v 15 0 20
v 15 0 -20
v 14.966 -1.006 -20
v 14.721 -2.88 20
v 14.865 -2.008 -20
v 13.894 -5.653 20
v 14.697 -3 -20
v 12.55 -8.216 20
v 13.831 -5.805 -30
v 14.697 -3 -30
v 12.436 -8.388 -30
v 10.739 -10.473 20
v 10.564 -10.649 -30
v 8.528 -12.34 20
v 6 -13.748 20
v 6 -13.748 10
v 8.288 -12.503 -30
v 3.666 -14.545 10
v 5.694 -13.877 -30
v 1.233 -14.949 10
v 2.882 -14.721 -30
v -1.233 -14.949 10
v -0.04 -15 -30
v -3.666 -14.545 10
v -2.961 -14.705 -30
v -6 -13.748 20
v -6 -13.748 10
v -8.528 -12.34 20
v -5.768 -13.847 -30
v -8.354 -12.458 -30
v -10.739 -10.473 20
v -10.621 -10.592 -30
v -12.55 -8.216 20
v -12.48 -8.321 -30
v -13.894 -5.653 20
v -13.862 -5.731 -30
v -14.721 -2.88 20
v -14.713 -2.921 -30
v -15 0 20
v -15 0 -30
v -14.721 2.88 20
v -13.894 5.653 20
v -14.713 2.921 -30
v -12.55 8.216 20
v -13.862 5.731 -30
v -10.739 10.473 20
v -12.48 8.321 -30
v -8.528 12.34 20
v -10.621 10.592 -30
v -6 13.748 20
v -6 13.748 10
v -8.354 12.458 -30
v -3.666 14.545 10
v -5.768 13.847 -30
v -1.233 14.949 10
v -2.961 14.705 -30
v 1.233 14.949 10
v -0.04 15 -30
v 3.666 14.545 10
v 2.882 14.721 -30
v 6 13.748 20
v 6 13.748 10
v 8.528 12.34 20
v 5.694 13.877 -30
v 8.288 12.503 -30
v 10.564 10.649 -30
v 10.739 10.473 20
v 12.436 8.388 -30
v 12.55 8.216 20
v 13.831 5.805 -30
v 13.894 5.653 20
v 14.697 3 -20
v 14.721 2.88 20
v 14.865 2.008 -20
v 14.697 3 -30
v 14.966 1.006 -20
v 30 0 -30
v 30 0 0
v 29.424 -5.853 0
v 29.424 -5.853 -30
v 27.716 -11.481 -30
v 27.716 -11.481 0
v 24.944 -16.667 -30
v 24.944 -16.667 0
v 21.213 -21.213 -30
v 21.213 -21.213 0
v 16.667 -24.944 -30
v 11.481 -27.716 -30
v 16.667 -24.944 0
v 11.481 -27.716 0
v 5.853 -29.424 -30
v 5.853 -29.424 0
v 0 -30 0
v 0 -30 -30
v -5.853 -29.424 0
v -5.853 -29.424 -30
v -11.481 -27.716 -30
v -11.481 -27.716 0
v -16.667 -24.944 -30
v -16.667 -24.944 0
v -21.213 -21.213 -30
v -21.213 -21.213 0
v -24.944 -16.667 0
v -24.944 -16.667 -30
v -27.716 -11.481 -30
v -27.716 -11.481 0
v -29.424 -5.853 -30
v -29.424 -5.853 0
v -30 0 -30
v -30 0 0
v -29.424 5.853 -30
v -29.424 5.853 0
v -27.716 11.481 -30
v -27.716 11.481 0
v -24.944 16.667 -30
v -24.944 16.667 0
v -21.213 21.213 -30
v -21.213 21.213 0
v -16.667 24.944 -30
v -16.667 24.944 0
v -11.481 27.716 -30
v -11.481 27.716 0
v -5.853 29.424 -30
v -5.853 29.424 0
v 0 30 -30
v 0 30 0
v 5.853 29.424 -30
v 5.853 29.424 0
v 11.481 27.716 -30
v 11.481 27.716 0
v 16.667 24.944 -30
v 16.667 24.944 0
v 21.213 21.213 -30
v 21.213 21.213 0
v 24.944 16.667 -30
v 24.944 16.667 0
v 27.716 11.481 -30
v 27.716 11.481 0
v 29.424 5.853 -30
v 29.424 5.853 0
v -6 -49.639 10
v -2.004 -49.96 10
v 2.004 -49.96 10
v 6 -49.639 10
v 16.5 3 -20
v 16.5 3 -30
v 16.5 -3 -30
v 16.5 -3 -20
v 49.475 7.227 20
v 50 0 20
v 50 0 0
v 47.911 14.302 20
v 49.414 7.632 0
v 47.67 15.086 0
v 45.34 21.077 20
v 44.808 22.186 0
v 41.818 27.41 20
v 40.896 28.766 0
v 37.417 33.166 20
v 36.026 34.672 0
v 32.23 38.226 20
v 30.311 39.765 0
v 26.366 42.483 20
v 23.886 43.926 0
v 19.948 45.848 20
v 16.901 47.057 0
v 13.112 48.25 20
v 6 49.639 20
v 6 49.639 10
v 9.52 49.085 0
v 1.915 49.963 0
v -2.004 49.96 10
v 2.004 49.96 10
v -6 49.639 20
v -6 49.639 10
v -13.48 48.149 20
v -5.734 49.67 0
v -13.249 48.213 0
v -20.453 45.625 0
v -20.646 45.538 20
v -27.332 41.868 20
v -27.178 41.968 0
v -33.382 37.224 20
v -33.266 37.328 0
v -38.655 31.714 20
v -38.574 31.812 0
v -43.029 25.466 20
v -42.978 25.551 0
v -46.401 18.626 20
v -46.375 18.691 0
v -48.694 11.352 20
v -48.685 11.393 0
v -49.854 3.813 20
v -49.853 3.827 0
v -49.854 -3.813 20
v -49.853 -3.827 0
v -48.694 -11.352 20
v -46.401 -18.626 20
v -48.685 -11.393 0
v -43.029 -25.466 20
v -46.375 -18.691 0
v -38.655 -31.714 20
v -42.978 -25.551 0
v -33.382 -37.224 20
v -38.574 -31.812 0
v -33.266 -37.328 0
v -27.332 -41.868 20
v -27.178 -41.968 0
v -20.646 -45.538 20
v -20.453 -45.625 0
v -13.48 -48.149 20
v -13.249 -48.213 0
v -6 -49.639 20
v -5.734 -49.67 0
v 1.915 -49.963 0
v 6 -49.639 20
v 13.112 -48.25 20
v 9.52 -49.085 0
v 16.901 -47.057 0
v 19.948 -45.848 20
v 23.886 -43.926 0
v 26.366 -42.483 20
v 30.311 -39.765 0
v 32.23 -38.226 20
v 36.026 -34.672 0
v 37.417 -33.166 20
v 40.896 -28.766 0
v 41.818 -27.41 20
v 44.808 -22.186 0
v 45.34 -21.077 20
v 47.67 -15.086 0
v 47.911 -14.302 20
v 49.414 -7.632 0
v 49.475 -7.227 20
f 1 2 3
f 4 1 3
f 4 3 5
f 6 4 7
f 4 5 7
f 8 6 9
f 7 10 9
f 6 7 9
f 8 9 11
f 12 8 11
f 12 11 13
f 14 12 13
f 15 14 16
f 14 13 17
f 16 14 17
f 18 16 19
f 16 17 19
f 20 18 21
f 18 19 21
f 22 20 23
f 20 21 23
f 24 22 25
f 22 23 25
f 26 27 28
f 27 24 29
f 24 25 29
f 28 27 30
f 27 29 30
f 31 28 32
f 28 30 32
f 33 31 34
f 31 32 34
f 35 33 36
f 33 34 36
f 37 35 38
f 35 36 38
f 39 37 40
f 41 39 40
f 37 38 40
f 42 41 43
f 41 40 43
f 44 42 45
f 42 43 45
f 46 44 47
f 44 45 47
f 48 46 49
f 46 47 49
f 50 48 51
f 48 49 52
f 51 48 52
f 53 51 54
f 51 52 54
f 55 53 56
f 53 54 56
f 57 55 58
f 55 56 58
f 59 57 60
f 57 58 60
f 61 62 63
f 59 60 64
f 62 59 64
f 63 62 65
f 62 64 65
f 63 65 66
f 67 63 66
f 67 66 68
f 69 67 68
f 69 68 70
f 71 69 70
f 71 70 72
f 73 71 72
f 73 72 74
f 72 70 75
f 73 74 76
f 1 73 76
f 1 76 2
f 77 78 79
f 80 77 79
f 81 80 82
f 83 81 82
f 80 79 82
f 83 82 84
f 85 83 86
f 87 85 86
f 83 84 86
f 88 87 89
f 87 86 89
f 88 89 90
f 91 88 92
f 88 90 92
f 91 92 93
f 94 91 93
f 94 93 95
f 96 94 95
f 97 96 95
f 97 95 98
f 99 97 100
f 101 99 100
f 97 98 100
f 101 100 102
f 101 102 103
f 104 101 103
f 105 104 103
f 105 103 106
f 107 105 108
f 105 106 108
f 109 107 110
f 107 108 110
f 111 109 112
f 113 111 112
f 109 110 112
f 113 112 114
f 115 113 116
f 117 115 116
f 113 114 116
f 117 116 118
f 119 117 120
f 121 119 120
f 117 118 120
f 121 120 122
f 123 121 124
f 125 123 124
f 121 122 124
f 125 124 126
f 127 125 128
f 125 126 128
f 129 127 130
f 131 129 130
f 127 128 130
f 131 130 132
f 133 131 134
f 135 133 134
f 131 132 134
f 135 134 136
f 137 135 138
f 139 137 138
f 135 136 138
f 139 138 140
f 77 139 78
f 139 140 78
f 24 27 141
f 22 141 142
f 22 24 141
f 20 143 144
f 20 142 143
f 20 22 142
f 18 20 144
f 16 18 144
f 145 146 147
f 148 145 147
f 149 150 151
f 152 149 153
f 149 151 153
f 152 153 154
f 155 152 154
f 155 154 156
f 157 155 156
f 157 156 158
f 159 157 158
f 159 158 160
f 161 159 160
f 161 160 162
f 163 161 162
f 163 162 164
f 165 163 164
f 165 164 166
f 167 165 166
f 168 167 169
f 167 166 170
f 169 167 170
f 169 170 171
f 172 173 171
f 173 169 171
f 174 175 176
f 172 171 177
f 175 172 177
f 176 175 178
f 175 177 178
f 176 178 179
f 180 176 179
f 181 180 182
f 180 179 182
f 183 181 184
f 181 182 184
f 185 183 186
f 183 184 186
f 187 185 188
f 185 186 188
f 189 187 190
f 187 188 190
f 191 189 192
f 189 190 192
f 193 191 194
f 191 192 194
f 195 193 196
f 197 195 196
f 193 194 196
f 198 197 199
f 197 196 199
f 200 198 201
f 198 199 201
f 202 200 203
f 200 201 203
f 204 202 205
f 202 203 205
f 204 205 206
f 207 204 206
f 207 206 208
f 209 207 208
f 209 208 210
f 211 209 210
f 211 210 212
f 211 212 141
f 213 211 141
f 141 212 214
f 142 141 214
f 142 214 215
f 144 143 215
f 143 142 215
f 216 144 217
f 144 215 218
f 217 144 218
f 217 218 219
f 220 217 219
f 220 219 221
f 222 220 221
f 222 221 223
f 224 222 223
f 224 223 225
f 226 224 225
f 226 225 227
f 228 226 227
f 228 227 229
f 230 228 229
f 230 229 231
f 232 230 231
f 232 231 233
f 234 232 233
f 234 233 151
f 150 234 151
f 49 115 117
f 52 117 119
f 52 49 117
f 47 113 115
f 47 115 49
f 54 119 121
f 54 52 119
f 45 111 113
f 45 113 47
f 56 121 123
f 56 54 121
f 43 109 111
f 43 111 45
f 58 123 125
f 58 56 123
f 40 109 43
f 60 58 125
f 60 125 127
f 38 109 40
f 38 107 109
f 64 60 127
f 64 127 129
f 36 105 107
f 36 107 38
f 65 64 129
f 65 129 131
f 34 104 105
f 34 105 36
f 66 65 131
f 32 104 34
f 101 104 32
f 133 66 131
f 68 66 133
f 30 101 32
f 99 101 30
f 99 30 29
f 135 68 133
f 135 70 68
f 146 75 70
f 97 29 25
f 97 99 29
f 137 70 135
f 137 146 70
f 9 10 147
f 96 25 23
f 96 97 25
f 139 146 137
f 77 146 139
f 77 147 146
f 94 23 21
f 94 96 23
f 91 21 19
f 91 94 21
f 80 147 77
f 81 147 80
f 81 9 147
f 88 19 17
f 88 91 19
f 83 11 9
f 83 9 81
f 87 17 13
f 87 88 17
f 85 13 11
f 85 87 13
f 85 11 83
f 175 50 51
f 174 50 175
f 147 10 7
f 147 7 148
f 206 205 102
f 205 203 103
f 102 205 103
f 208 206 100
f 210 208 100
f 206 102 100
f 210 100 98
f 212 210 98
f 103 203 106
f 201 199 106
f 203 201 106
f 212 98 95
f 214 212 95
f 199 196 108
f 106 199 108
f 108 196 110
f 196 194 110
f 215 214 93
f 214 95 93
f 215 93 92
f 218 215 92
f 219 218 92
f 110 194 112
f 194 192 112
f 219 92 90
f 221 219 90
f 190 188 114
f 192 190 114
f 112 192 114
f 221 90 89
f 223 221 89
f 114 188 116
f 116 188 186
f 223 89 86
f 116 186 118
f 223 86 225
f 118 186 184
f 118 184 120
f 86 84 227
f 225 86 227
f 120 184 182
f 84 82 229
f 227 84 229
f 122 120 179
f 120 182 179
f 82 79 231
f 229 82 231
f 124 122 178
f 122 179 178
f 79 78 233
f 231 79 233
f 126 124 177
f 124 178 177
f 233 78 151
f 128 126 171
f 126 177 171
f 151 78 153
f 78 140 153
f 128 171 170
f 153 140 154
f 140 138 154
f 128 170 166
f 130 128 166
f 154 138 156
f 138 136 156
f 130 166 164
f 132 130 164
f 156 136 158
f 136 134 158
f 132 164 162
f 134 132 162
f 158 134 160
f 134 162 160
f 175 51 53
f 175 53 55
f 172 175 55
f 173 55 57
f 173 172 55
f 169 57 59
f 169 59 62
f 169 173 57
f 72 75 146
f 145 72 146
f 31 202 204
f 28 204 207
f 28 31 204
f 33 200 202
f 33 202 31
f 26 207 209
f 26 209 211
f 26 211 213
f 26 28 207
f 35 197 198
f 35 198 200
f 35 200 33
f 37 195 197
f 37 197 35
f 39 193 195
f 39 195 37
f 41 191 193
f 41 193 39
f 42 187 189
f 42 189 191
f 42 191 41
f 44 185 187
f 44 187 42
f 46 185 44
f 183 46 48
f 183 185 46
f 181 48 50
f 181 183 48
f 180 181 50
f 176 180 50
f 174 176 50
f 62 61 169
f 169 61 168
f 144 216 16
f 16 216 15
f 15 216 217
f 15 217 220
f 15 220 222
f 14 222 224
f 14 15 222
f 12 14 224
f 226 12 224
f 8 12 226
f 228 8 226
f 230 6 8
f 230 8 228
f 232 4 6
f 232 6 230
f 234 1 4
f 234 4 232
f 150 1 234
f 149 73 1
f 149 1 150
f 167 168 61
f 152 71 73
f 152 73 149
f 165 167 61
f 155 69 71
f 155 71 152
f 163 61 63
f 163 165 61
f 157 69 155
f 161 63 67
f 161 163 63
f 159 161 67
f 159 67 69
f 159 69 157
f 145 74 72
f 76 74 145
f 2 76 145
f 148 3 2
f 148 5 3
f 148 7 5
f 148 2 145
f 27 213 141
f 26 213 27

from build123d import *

# Parameters (mm, degrees)
F0_R     = 50
F1_DEPTH = 20
F2_W     = 12
F2_H     = 130.80296
F3_DEPTH = 10
F4_R     = 30
F5_DEPTH = 30
F7_W     = 3
F7_H     = 6
F8_DEPTH = 10
F6_R     = 15
F9_DEPTH = 50.001


with BuildPart() as f1:
    # F0 (on Top) → F1 (new body)
    with BuildSketch(Plane.XY):
        Circle(F0_R)
    extrude(amount=F1_DEPTH)

    # F2 (on face) → F3 (cut)
    with BuildSketch(Plane.XY.offset(20)):
        Rectangle(F2_W, F2_H)
    extrude(amount=-F3_DEPTH, mode=Mode.SUBTRACT)

    # F4 (on face) → F5 (join)
    with BuildSketch(Plane(origin=(0, 0, 0), x_dir=(1, 0, 0), z_dir=(0, 0, -1))):
        Circle(F4_R)
    extrude(amount=F5_DEPTH)

    # F7 (on face) → F8 (cut)
    with BuildSketch(Plane(origin=(0, 0, -30), x_dir=(1, 0, 0), z_dir=(0, 0, -1))):
        with Locations((15, 0)):
            Rectangle(F7_W, F7_H)
    extrude(amount=-F8_DEPTH, mode=Mode.SUBTRACT)

    # F6 (on face) → F9 (cut, through all)
    with BuildSketch(Plane(origin=(0, 0, -30), x_dir=(1, 0, 0), z_dir=(0, 0, -1))):
        Circle(F6_R)
    extrude(amount=-F9_DEPTH, mode=Mode.SUBTRACT)


solid = f1.part
